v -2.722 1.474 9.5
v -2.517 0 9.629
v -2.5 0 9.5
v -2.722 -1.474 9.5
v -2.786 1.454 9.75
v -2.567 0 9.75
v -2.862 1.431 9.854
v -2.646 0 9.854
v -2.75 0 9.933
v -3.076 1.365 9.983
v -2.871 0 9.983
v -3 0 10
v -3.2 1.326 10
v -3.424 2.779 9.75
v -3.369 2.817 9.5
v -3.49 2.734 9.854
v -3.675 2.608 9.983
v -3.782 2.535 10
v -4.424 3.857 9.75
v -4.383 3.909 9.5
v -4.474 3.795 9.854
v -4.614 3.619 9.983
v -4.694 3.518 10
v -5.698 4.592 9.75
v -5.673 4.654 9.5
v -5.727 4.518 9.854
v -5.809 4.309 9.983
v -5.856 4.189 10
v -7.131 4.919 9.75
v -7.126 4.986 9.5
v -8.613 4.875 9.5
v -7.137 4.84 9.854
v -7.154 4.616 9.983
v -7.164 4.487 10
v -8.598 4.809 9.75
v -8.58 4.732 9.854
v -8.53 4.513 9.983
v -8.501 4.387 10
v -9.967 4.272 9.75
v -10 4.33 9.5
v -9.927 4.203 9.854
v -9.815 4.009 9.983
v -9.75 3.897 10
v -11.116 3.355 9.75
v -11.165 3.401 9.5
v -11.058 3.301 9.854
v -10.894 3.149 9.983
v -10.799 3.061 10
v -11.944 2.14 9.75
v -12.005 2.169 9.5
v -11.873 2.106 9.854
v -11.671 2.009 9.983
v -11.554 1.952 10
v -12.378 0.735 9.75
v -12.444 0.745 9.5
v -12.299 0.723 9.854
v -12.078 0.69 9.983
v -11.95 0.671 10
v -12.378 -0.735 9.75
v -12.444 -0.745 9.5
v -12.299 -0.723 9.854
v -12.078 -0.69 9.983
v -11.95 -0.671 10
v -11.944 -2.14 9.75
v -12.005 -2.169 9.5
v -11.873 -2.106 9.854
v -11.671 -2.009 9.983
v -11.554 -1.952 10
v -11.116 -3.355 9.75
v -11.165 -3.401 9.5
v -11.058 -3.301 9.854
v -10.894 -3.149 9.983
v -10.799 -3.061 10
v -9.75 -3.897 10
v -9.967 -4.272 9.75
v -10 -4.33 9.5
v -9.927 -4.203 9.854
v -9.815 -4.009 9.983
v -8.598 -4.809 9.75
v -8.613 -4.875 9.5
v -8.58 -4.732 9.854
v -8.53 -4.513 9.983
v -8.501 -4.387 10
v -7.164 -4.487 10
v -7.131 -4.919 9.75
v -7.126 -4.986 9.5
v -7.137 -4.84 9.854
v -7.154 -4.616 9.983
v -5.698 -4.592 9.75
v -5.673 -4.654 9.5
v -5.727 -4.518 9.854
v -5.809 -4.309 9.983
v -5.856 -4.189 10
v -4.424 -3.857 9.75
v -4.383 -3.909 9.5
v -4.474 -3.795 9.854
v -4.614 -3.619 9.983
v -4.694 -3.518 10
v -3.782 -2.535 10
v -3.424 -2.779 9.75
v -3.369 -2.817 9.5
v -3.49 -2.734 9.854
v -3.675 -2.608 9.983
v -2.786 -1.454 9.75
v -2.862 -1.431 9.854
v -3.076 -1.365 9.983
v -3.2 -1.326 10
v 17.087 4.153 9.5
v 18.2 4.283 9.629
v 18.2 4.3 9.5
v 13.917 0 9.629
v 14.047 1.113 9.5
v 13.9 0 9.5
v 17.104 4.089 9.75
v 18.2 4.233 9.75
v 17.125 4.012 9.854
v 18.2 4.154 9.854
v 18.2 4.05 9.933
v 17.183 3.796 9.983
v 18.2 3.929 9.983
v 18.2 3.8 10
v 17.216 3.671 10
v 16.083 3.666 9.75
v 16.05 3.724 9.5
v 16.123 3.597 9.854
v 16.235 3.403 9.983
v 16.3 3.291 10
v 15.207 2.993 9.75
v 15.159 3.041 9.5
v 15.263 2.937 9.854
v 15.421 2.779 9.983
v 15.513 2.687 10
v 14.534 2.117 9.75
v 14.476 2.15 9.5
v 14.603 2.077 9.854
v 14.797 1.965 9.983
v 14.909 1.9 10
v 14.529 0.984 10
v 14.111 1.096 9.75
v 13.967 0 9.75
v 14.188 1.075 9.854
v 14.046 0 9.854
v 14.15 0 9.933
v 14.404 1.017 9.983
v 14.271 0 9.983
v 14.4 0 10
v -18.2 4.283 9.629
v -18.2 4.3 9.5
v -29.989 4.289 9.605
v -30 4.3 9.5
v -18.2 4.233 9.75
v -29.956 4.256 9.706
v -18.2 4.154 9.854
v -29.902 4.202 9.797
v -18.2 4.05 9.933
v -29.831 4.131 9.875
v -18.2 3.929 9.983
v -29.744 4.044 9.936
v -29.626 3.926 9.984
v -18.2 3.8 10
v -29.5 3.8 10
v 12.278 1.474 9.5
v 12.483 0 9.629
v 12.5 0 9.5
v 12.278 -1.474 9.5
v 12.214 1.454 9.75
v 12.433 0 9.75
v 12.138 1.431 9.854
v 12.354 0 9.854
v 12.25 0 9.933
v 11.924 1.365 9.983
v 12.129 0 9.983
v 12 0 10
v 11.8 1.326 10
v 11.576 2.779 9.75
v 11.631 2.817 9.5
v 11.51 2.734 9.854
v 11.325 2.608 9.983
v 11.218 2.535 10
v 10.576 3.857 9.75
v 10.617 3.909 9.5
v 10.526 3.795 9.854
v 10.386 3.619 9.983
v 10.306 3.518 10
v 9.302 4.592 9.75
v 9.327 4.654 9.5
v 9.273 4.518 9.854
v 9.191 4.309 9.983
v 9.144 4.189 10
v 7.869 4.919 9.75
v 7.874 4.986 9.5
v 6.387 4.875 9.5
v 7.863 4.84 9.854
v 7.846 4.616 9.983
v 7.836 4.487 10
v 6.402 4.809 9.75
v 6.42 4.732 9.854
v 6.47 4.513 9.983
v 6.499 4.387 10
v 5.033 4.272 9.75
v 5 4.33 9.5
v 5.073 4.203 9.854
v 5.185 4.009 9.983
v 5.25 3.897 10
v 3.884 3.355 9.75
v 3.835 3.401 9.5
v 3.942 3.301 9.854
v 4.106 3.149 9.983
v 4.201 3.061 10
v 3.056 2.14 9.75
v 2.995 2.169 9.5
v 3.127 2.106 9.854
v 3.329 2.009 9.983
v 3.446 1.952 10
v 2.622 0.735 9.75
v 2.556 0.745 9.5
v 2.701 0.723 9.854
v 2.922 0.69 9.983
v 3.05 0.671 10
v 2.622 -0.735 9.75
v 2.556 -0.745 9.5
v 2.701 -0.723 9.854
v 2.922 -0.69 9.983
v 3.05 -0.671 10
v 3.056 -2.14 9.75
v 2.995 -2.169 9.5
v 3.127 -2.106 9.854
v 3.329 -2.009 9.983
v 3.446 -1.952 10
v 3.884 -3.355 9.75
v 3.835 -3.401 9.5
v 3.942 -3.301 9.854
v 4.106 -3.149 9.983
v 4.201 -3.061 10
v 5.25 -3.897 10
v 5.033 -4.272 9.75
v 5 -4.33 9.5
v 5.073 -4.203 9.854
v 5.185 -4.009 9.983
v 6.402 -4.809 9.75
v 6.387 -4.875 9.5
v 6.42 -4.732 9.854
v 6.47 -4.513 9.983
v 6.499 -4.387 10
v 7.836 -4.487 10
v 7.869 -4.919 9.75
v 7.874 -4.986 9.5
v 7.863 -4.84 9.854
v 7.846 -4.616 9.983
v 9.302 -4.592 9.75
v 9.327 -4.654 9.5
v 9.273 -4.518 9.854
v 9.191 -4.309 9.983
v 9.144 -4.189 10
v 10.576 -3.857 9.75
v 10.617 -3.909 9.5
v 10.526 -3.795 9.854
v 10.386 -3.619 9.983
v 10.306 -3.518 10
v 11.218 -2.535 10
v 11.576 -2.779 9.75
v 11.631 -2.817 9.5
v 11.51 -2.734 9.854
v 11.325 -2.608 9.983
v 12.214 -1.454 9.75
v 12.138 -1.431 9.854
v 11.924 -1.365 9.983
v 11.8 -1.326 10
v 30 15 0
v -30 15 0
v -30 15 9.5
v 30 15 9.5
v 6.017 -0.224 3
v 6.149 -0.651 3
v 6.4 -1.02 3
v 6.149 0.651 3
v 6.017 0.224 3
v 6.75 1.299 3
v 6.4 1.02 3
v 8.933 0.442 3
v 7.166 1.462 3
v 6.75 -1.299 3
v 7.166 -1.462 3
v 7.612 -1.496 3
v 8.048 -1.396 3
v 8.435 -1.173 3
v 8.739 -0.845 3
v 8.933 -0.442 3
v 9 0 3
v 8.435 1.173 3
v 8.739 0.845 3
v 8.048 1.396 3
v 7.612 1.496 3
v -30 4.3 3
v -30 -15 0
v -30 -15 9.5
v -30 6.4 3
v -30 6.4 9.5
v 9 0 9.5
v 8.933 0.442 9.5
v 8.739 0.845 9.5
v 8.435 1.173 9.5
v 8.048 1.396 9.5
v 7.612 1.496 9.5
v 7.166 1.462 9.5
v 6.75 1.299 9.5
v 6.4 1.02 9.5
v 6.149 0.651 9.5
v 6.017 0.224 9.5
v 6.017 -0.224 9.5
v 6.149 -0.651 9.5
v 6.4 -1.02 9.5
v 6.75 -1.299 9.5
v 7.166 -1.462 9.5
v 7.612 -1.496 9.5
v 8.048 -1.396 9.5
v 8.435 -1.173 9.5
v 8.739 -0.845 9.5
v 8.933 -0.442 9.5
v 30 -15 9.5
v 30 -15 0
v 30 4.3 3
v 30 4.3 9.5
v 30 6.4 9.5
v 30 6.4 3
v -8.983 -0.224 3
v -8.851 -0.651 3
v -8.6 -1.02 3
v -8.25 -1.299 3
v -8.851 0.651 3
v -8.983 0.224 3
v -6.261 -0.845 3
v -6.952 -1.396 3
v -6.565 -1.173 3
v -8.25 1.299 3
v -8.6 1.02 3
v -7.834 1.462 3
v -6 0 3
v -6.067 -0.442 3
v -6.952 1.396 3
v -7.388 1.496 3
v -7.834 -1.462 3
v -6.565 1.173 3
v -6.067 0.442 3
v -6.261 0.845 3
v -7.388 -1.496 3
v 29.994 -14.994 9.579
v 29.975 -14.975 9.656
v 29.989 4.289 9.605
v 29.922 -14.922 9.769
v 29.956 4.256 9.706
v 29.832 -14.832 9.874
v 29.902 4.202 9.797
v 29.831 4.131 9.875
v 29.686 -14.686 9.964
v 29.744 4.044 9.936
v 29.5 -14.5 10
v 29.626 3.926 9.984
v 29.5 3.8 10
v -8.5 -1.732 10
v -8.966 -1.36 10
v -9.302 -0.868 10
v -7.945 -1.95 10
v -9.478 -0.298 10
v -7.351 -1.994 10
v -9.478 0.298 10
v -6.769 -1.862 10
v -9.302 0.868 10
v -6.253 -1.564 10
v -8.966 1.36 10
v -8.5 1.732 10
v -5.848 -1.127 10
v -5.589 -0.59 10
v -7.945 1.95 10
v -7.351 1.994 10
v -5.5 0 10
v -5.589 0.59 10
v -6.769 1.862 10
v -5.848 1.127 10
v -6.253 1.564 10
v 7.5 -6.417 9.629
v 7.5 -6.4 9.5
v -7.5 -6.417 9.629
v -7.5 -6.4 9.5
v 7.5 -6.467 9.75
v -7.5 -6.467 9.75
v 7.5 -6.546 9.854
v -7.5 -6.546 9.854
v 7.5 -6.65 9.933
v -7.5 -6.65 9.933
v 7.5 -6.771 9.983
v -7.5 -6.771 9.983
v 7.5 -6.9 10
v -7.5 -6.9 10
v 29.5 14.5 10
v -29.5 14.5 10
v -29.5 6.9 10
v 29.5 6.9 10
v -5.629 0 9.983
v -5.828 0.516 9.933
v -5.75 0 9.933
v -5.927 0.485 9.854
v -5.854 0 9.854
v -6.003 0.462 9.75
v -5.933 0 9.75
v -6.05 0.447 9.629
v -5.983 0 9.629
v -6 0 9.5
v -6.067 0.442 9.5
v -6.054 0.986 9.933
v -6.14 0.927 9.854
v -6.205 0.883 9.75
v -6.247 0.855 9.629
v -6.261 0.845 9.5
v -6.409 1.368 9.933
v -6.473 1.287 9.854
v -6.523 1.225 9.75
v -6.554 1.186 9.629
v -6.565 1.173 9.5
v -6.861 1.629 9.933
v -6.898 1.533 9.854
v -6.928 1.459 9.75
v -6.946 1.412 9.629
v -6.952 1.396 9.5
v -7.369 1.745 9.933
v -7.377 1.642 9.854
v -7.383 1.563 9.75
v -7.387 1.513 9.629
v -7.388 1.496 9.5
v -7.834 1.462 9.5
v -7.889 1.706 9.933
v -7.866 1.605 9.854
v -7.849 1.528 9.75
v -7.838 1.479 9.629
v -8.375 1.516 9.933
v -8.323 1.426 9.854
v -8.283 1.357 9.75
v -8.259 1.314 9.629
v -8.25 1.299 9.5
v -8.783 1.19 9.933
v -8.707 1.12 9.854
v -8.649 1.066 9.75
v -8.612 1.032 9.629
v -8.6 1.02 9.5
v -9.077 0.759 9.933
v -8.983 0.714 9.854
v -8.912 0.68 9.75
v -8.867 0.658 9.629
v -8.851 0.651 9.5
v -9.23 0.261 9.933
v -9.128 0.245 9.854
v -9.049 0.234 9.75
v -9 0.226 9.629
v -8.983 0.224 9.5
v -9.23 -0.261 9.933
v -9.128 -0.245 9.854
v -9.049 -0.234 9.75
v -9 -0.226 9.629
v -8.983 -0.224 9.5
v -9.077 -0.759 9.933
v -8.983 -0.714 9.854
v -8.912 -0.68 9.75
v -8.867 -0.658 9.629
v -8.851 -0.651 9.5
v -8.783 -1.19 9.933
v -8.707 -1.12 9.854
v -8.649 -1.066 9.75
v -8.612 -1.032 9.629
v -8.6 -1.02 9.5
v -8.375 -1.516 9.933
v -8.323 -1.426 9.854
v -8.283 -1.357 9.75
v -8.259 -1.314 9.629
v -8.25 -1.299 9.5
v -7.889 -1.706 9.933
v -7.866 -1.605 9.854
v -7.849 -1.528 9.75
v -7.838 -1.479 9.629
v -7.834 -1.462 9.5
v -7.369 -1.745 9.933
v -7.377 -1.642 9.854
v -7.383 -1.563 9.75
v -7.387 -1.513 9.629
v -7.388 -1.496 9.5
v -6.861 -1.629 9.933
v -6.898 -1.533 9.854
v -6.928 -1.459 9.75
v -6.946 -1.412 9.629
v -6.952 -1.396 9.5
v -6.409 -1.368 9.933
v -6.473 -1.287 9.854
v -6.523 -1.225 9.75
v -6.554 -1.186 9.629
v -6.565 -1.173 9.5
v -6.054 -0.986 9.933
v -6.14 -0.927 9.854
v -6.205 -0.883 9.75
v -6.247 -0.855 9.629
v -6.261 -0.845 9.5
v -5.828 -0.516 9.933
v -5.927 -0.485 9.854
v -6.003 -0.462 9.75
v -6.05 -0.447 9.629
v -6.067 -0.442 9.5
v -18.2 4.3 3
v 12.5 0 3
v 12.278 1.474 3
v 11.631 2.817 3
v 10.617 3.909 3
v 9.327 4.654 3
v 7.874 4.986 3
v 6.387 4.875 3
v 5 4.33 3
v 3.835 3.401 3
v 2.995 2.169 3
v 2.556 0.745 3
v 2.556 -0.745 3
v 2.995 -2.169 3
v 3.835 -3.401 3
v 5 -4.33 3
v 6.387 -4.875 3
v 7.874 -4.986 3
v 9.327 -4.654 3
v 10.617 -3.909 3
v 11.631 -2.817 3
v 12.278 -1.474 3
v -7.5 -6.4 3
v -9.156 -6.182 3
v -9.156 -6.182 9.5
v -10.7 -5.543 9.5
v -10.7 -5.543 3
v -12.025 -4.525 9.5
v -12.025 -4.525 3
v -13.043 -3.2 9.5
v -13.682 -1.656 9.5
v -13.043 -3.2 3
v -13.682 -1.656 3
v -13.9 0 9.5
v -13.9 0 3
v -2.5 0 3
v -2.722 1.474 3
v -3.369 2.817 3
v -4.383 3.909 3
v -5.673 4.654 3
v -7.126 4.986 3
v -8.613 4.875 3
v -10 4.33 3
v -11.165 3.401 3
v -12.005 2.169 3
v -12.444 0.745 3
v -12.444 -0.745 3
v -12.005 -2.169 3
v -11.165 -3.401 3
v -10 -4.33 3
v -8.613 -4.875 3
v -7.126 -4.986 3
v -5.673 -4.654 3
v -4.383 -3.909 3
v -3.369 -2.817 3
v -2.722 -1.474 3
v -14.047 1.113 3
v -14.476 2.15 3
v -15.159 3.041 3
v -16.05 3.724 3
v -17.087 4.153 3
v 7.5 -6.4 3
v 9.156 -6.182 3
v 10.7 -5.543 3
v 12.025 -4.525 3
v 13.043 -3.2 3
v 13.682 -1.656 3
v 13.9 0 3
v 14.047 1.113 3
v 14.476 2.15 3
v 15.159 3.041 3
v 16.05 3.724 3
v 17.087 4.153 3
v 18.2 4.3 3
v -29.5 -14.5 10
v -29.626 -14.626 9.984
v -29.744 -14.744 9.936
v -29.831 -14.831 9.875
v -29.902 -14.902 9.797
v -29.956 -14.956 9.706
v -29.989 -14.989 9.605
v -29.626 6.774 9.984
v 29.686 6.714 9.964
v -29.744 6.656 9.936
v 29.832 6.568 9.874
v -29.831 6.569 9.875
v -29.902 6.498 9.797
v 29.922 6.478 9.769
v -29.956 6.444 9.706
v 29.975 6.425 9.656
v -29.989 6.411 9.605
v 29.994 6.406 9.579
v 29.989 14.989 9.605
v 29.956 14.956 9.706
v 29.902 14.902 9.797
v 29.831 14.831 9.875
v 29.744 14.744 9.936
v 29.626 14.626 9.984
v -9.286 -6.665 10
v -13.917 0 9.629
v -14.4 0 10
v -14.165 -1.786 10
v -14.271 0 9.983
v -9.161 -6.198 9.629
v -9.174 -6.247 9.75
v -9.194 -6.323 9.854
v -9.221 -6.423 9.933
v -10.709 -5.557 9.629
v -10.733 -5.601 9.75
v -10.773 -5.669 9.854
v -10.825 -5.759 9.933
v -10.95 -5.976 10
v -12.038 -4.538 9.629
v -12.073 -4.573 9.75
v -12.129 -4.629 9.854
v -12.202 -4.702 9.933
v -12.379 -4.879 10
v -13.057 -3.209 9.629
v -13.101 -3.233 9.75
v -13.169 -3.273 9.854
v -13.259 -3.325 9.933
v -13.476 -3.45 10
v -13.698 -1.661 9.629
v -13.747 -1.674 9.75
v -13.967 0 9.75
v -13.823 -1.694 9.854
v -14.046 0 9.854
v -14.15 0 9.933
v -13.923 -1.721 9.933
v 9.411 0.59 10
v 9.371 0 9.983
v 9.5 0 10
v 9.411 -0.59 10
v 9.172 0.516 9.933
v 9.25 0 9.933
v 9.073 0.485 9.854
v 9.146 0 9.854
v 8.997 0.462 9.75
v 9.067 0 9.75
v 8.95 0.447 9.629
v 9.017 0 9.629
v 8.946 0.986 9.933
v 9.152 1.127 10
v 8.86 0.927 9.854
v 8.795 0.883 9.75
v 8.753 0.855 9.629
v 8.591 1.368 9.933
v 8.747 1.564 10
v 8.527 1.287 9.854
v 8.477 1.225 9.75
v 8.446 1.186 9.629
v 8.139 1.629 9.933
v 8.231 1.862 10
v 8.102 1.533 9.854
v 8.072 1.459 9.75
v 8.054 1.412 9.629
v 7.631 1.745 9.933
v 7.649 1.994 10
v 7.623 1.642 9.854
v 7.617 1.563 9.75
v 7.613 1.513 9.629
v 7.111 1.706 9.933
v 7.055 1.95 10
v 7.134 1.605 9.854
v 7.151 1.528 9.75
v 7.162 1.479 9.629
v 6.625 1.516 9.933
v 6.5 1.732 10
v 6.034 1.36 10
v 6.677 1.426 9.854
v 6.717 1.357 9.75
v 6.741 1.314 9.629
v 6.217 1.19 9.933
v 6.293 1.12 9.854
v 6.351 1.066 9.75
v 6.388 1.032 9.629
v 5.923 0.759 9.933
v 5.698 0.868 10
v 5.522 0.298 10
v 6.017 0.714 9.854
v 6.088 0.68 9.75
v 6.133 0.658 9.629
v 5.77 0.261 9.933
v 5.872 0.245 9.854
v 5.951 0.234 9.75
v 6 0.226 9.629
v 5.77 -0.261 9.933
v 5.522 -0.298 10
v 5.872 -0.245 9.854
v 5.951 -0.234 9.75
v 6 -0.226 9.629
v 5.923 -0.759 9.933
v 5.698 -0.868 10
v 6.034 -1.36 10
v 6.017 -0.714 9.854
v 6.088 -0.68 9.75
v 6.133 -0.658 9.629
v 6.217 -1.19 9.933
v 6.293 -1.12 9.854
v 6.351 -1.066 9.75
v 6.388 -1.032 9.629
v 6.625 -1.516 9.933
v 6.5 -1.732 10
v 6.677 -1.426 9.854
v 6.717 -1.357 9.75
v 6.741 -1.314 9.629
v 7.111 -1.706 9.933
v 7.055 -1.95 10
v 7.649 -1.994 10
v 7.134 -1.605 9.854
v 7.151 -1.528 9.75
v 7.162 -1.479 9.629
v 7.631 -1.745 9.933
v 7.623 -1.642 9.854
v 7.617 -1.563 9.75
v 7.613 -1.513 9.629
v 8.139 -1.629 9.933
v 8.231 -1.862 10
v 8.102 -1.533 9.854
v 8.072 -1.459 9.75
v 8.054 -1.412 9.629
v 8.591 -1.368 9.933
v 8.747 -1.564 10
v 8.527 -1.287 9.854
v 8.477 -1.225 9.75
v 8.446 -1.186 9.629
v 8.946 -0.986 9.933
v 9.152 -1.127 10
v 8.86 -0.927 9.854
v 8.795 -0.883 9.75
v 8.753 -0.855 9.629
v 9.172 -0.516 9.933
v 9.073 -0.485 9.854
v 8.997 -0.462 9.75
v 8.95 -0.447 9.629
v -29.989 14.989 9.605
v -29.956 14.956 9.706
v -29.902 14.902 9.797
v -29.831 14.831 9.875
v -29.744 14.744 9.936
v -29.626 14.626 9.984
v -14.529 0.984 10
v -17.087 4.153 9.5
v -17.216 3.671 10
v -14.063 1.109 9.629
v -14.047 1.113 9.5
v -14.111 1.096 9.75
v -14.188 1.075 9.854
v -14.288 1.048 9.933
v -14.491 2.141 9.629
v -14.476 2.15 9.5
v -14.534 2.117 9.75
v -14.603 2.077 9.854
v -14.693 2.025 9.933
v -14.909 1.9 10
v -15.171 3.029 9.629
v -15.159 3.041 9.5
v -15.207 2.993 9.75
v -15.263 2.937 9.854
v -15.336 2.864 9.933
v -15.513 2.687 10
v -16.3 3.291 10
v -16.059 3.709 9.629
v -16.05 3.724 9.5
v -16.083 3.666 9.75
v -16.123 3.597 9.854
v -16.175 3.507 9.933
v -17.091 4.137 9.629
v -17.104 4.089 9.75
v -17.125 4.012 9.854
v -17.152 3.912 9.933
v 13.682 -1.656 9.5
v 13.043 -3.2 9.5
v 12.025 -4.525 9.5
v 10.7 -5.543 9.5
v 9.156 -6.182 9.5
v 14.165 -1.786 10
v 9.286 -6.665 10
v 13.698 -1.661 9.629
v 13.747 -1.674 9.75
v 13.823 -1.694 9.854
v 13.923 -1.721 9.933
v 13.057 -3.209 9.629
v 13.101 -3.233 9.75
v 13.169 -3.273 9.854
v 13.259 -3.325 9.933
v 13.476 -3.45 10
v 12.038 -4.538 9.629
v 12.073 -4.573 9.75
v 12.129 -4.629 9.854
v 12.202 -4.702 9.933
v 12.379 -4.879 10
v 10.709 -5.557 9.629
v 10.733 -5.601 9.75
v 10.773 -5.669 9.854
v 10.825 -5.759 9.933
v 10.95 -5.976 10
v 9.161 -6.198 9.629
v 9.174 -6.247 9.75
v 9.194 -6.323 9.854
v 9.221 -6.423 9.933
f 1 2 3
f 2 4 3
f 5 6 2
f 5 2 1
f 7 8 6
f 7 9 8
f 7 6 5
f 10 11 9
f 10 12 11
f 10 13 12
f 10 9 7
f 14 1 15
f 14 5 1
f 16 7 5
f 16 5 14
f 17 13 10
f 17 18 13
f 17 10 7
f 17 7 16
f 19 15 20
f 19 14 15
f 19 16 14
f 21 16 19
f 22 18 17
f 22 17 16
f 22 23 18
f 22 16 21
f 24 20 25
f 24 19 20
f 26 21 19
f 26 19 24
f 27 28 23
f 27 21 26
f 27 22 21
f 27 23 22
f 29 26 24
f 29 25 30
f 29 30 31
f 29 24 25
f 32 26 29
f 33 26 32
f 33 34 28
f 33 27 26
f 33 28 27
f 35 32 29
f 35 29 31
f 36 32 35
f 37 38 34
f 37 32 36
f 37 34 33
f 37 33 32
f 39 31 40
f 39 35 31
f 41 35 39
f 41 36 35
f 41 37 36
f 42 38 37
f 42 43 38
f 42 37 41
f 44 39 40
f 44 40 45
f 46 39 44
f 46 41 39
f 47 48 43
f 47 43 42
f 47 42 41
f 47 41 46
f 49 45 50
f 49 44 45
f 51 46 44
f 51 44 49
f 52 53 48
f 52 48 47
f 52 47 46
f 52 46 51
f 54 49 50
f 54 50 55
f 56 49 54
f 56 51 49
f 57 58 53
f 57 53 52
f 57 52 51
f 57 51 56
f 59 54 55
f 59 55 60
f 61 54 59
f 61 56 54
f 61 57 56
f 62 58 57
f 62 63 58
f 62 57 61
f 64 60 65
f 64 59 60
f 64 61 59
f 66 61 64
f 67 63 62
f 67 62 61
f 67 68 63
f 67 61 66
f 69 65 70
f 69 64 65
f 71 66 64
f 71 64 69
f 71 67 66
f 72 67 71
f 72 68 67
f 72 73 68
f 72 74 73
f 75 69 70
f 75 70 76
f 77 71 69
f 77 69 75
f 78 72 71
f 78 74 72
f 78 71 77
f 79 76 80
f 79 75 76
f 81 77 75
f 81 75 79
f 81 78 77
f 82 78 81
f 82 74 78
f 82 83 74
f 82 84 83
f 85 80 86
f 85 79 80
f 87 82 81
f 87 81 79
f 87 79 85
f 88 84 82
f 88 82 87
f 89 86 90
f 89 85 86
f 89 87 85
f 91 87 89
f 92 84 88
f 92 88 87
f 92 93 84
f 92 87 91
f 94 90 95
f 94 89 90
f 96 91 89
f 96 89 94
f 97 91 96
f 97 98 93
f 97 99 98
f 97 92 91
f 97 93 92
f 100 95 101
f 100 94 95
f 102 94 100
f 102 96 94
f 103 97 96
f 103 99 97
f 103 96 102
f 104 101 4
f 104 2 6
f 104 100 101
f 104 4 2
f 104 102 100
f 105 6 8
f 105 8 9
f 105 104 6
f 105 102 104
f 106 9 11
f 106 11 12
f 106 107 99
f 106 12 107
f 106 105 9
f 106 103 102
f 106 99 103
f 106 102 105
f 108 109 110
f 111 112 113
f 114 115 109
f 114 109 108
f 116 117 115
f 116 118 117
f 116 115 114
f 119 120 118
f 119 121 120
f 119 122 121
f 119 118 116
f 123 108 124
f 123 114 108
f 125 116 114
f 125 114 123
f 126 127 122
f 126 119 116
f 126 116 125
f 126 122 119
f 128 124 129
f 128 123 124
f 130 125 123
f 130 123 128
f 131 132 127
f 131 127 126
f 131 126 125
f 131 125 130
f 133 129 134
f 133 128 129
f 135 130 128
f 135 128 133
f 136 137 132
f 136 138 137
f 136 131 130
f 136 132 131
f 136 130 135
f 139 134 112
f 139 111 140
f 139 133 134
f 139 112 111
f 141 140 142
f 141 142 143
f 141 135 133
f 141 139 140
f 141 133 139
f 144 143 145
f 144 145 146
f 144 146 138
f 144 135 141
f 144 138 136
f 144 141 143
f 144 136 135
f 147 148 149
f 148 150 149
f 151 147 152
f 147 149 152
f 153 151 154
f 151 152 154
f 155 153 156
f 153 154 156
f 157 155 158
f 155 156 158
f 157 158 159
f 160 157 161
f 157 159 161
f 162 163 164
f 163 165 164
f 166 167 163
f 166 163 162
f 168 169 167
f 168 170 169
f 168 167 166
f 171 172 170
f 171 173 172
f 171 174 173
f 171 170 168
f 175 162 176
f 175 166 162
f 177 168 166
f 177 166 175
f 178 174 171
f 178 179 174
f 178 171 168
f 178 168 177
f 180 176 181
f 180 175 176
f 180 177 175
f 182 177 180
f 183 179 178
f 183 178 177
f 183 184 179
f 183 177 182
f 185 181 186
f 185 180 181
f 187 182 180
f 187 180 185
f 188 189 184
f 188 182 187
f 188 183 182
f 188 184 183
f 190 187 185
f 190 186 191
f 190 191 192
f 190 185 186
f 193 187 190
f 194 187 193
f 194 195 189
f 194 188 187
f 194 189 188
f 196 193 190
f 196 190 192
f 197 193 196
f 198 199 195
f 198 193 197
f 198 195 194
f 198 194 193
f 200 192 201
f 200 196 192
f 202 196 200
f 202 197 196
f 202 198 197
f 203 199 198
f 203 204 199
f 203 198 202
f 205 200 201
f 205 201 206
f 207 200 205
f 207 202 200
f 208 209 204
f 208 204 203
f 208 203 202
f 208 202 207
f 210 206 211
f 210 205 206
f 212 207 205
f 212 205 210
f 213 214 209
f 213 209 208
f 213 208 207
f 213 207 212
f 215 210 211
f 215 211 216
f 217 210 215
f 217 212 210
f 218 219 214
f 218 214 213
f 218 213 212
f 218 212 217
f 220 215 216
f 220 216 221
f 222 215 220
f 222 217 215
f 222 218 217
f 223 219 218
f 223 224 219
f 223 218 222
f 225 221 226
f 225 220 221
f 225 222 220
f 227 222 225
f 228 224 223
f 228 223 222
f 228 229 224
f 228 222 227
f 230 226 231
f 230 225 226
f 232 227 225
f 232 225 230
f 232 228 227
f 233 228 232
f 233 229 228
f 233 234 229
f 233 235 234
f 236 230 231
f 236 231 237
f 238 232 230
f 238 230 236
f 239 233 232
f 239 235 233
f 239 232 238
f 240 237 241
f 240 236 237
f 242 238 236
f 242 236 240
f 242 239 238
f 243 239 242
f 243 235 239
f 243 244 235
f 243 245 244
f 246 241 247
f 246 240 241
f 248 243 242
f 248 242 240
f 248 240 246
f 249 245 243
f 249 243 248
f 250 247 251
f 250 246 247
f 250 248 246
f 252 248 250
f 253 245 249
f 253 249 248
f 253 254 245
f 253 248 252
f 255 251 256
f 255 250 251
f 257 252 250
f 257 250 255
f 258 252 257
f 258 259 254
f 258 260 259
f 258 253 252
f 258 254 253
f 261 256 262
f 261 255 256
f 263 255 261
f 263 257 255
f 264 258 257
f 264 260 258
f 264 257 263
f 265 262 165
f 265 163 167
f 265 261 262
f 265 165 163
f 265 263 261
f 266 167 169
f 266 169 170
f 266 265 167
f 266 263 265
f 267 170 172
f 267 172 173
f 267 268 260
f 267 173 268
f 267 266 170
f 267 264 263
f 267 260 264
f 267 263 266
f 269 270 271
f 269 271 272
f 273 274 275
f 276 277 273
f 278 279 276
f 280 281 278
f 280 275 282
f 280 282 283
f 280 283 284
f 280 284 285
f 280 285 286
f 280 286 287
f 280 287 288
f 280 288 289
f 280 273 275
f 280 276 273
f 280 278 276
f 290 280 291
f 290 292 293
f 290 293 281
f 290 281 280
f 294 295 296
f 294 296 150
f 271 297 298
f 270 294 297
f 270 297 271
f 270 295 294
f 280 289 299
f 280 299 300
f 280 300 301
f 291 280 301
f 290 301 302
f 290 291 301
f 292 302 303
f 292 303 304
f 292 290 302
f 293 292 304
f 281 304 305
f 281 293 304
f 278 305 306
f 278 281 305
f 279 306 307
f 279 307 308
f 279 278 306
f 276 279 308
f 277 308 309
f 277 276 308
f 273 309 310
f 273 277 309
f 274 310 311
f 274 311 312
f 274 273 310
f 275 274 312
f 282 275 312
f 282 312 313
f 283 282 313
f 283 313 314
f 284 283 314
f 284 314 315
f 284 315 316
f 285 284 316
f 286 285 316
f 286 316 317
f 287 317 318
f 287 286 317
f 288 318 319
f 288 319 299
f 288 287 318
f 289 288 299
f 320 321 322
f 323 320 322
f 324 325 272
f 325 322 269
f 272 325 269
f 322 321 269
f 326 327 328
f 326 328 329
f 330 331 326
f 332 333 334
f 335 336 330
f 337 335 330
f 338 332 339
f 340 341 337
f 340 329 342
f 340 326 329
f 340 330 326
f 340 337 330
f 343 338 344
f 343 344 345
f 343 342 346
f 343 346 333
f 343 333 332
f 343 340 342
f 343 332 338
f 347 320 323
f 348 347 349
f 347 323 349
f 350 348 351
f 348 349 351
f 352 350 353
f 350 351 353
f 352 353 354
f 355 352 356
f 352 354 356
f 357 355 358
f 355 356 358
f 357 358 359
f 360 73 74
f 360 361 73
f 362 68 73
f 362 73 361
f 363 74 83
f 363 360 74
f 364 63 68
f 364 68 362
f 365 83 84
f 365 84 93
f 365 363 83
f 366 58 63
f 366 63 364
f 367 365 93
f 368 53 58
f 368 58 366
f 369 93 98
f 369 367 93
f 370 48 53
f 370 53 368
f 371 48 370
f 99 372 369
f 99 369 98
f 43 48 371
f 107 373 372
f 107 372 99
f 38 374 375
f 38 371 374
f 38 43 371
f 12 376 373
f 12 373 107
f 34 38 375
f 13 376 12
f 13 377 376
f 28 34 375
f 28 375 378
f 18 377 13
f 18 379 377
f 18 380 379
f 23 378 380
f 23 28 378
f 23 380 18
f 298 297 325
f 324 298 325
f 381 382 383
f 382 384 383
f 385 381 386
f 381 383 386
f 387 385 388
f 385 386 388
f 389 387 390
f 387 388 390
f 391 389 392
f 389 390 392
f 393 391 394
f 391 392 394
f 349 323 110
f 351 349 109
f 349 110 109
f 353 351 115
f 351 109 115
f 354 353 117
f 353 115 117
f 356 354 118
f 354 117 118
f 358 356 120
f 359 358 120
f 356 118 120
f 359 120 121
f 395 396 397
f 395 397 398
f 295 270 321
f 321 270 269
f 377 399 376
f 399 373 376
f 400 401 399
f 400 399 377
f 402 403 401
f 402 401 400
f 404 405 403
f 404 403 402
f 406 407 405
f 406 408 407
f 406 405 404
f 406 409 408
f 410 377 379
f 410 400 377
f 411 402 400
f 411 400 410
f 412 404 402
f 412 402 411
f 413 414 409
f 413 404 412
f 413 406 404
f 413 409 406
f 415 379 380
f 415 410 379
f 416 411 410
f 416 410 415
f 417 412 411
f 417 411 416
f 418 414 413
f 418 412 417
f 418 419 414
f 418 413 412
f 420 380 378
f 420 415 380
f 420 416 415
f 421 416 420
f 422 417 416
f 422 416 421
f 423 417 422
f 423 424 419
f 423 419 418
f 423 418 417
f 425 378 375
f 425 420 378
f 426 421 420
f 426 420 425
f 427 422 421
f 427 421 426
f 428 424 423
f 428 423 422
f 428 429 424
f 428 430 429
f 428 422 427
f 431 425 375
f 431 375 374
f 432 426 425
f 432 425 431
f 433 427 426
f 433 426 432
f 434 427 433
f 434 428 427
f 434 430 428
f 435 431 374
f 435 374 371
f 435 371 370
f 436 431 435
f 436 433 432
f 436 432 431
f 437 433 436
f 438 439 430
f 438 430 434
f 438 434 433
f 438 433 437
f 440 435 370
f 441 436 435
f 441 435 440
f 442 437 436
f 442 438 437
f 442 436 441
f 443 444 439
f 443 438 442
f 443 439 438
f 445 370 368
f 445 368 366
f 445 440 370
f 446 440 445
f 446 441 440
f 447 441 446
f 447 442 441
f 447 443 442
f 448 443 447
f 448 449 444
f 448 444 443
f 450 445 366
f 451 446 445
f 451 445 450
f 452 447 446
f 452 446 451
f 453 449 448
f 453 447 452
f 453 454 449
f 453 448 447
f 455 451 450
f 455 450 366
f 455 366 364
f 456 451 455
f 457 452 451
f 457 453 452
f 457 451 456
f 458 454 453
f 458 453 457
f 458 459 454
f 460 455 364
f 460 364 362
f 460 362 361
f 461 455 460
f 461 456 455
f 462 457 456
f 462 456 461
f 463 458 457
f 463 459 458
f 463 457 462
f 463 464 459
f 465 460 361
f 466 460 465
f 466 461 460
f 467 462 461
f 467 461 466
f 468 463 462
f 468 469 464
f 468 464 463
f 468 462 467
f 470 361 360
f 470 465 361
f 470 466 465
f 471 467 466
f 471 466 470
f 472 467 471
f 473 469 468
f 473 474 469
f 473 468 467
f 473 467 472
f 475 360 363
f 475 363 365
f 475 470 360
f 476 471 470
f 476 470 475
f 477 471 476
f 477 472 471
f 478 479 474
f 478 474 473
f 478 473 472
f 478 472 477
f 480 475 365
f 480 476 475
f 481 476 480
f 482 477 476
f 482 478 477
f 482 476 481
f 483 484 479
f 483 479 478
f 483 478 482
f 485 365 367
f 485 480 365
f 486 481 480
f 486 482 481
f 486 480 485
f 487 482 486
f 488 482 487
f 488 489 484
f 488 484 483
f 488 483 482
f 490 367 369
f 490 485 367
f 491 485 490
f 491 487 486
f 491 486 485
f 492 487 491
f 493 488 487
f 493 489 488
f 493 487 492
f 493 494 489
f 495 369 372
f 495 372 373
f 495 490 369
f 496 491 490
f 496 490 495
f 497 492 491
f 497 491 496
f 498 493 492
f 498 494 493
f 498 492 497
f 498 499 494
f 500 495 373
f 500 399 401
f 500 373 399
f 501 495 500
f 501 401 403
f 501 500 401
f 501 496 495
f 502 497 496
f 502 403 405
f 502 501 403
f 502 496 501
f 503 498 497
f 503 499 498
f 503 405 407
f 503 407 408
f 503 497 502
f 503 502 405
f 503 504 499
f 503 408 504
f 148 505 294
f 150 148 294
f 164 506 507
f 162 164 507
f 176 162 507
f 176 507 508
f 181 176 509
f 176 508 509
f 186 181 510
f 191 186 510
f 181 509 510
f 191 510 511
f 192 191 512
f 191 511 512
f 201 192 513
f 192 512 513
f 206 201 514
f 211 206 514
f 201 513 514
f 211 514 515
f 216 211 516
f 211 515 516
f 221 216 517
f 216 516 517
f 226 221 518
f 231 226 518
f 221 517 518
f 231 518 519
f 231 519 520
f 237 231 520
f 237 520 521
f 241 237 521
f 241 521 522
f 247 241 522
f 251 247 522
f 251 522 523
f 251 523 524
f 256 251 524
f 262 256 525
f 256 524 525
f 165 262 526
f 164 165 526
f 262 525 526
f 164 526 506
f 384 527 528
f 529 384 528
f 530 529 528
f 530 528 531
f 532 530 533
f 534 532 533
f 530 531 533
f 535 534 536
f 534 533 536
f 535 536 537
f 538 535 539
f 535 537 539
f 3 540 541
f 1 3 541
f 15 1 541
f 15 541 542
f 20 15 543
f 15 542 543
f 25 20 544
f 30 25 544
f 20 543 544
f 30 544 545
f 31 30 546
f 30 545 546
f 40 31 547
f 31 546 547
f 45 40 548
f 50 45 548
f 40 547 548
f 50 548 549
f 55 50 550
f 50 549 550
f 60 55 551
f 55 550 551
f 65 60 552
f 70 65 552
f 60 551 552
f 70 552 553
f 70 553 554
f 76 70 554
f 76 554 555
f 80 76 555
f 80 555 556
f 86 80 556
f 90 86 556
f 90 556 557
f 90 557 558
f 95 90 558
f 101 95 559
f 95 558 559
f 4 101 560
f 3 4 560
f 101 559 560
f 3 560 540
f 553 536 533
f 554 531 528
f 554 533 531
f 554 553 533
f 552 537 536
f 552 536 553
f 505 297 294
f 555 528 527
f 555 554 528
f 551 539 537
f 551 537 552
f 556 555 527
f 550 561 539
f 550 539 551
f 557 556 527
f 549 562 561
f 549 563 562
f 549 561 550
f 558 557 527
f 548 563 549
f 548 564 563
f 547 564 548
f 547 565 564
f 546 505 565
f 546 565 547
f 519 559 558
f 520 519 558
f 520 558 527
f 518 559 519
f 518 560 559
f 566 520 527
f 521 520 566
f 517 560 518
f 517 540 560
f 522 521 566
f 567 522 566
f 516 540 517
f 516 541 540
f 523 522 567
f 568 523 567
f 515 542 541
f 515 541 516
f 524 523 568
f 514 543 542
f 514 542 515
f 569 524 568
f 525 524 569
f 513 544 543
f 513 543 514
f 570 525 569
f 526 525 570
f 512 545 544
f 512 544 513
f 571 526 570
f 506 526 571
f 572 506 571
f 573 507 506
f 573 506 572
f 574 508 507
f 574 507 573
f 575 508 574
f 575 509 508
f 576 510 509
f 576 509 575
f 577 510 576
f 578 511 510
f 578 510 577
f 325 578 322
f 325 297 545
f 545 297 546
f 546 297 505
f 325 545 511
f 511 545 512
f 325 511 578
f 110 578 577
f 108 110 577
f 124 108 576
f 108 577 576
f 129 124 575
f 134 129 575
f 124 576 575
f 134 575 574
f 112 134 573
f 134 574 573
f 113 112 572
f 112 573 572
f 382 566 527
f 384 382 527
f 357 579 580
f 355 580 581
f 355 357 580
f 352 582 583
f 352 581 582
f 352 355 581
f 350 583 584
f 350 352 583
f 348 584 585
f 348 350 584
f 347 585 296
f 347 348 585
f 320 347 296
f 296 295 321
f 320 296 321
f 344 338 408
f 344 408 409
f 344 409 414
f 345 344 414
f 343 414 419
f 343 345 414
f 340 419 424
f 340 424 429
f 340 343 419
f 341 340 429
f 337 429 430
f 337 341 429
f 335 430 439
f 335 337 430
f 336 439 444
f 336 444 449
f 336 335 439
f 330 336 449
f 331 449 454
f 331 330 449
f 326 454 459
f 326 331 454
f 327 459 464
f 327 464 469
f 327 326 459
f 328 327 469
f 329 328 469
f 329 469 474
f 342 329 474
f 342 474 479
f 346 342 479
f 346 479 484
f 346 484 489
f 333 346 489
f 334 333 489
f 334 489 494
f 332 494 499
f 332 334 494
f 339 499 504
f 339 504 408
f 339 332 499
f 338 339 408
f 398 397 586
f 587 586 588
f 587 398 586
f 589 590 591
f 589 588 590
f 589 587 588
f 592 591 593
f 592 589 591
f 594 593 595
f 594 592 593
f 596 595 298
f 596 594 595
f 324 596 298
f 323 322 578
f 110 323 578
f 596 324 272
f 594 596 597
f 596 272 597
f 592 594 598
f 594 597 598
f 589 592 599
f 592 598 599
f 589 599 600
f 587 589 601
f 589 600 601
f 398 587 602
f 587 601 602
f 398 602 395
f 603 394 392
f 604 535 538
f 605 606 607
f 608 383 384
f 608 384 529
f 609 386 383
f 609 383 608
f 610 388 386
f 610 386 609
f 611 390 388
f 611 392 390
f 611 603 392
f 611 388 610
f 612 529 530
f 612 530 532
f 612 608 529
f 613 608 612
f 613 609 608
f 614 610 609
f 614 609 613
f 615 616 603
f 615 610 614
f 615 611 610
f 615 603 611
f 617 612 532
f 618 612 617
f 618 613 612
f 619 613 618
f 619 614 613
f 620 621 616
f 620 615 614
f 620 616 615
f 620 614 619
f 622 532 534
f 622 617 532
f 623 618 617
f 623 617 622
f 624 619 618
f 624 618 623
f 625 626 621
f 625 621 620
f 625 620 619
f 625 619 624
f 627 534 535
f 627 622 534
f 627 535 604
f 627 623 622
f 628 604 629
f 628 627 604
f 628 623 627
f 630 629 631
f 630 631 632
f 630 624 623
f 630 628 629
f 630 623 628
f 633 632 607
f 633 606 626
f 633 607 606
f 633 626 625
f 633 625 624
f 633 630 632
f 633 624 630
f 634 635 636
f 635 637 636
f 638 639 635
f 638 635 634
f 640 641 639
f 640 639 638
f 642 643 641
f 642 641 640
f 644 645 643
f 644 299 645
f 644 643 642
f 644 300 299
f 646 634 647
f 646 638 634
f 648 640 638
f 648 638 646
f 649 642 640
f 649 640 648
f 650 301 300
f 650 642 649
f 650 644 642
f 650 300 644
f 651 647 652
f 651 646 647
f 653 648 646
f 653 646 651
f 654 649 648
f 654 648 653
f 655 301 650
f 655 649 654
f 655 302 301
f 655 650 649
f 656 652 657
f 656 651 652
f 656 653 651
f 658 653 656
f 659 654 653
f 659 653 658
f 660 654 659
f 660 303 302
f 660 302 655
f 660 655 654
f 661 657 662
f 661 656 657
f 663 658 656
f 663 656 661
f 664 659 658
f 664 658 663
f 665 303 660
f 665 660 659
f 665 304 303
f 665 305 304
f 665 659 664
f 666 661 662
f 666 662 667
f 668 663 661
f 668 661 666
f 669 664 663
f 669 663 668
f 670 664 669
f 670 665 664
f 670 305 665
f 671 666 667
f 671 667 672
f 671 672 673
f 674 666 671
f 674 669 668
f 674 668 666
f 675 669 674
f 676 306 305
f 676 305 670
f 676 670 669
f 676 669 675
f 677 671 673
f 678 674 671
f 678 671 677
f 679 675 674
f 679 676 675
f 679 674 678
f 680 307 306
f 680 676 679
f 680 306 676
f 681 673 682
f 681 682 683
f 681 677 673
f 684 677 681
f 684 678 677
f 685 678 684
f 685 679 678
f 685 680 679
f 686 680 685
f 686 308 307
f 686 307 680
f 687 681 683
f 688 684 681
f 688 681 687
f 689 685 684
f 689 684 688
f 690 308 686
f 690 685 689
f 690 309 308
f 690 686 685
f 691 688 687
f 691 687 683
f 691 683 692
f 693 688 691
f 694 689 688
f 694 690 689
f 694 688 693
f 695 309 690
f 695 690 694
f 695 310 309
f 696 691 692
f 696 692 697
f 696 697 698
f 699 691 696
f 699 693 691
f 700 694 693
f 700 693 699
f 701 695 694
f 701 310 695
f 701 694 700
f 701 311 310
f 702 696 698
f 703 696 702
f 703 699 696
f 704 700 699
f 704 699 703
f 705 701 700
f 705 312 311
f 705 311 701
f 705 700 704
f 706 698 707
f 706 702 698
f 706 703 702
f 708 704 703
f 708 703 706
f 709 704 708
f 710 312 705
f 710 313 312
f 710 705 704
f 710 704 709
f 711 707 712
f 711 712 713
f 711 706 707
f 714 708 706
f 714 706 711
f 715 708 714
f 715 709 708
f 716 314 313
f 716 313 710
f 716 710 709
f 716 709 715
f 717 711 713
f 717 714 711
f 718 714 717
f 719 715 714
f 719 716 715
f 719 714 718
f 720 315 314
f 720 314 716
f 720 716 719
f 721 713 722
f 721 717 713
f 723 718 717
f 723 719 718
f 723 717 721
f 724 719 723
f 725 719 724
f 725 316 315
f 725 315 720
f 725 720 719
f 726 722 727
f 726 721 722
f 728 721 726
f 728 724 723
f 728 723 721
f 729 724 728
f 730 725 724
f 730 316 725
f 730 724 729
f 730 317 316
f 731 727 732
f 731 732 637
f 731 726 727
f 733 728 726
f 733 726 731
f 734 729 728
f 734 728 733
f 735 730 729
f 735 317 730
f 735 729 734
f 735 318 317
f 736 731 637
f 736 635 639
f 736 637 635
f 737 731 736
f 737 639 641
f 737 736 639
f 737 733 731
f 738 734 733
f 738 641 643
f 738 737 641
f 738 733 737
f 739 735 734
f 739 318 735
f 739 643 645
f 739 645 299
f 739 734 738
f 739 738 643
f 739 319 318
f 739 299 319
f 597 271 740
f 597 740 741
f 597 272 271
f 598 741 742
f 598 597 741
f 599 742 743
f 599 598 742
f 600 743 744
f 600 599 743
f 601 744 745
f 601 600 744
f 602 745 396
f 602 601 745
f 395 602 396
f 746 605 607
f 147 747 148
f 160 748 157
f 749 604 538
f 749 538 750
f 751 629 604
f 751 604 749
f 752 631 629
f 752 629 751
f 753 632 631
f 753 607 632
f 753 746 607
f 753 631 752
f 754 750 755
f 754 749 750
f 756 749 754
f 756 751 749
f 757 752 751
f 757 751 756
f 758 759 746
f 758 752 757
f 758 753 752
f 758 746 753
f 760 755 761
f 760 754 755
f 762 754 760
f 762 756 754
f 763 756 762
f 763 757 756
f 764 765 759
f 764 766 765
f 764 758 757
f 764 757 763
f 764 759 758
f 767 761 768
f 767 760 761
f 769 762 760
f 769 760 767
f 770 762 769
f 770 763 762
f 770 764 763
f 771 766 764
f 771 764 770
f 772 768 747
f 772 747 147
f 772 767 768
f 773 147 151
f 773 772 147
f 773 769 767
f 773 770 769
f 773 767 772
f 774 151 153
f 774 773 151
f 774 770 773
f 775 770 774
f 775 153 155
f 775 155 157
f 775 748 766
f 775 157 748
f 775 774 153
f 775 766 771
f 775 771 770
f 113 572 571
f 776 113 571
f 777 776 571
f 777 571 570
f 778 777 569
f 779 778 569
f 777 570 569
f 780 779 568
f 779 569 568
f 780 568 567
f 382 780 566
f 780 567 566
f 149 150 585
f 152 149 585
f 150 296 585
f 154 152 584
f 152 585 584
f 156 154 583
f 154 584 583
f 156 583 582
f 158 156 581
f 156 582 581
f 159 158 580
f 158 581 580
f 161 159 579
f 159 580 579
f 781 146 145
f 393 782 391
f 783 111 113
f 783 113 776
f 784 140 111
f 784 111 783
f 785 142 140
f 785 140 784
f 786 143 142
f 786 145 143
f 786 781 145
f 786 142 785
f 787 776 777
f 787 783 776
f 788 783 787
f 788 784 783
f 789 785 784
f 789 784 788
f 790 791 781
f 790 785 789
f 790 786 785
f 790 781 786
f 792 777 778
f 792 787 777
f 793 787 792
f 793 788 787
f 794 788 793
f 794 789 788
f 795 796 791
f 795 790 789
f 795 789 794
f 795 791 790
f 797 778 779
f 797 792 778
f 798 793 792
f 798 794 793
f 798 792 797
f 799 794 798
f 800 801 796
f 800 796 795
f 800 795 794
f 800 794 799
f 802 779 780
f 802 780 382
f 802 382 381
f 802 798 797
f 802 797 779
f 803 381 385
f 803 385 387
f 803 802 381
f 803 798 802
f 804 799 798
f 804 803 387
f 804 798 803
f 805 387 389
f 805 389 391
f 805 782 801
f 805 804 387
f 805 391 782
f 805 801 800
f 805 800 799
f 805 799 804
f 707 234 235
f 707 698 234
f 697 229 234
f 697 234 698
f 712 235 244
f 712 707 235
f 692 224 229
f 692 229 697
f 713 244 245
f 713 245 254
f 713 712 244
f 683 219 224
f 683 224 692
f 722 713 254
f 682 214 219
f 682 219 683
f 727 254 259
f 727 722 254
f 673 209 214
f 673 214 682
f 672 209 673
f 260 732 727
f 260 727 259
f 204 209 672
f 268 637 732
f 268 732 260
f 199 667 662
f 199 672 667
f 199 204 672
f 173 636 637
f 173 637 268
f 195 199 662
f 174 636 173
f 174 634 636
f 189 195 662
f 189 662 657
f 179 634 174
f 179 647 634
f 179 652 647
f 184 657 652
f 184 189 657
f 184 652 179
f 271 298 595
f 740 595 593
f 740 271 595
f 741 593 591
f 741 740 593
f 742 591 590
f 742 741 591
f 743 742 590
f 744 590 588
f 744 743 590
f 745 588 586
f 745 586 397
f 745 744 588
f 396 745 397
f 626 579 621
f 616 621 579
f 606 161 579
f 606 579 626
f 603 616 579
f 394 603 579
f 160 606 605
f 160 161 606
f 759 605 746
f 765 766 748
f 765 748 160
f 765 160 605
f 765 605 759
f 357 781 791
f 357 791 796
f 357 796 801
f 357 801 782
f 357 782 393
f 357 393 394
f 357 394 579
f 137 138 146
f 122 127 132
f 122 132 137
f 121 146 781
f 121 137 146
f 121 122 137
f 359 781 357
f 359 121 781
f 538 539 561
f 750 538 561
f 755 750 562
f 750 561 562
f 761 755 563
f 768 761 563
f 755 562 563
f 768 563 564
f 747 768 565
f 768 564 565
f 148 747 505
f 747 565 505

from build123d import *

# Parameters (mm, degrees)
F0_W     = 60
F0_H     = 30
F1_DEPTH = 3
F2_W     = 60
F2_H     = 8.6
F2_R     = 5
F2_R_2   = 1.5
F3_DEPTH = 7
F4_R     = 0.5


with BuildPart() as f1:
    # F0 (on Top) → F1 (new body)
    with BuildSketch(Plane.XY):
        Rectangle(F0_W, F0_H)
    extrude(amount=F1_DEPTH)

    # F2 (on face) → F3 (join)
    with BuildSketch(Plane.XY.offset(3)):
        with Locations((0, 10.7)):
            Rectangle(F2_W, F2_H)
        with Locations((-7.5, 0)):
            Circle(F2_R)
        with Locations((-7.5, 0)):
            Circle(F2_R_2, mode=Mode.SUBTRACT)
        with Locations((7.5, 0)):
            Circle(F2_R)
        with Locations((7.5, 0)):
            Circle(F2_R_2, mode=Mode.SUBTRACT)
        with BuildLine():
            Line((-18.2, 4.3), (-30, 4.3))
            Line((-30, 4.3), (-30, -15))
            Line((-30, -15), (30, -15))
            Line((30, -15), (30, 4.3))
            Line((30, 4.3), (18.2, 4.3))
            ThreePointArc((18.2, 4.3), (15.159441, 3.040559), (13.9, 0))
            ThreePointArc((13.9, 0), (12.025483, -4.525483), (7.5, -6.4))
            Line((7.5, -6.4), (-7.5, -6.4))
            ThreePointArc((-7.5, -6.4), (-12.025483, -4.525483), (-13.9, 0))
            ThreePointArc((-13.9, 0), (-15.159441, 3.040559), (-18.2, 4.3))
        make_face()
    extrude(amount=F3_DEPTH)

    # F4
    f4_edges = [f1.edges().sort_by_distance(p)[0] for p in [
        (-15.159441, 3.040559, 10),
        (-24.1, 4.3, 10),
        (-30, -5.35, 10),
        (0, -15, 10),
        (30, -5.35, 10),
        (24.1, 4.3, 10),
        (15.159441, 3.040559, 10),
        (12.025483, -4.525483, 10),
        (0, -6.4, 10),
        (-12.025483, -4.525483, 10),
        (0, 15, 10),
        (-30, 10.7, 10),
        (0, 6.4, 10),
        (30, 10.7, 10),
        (-12.5, 0, 10),
        (-9, 0, 10),
        (2.5, 0, 10),
        (6, 0, 10),
    ]]
    fillet(f4_edges, radius=F4_R)


solid = f1.part
